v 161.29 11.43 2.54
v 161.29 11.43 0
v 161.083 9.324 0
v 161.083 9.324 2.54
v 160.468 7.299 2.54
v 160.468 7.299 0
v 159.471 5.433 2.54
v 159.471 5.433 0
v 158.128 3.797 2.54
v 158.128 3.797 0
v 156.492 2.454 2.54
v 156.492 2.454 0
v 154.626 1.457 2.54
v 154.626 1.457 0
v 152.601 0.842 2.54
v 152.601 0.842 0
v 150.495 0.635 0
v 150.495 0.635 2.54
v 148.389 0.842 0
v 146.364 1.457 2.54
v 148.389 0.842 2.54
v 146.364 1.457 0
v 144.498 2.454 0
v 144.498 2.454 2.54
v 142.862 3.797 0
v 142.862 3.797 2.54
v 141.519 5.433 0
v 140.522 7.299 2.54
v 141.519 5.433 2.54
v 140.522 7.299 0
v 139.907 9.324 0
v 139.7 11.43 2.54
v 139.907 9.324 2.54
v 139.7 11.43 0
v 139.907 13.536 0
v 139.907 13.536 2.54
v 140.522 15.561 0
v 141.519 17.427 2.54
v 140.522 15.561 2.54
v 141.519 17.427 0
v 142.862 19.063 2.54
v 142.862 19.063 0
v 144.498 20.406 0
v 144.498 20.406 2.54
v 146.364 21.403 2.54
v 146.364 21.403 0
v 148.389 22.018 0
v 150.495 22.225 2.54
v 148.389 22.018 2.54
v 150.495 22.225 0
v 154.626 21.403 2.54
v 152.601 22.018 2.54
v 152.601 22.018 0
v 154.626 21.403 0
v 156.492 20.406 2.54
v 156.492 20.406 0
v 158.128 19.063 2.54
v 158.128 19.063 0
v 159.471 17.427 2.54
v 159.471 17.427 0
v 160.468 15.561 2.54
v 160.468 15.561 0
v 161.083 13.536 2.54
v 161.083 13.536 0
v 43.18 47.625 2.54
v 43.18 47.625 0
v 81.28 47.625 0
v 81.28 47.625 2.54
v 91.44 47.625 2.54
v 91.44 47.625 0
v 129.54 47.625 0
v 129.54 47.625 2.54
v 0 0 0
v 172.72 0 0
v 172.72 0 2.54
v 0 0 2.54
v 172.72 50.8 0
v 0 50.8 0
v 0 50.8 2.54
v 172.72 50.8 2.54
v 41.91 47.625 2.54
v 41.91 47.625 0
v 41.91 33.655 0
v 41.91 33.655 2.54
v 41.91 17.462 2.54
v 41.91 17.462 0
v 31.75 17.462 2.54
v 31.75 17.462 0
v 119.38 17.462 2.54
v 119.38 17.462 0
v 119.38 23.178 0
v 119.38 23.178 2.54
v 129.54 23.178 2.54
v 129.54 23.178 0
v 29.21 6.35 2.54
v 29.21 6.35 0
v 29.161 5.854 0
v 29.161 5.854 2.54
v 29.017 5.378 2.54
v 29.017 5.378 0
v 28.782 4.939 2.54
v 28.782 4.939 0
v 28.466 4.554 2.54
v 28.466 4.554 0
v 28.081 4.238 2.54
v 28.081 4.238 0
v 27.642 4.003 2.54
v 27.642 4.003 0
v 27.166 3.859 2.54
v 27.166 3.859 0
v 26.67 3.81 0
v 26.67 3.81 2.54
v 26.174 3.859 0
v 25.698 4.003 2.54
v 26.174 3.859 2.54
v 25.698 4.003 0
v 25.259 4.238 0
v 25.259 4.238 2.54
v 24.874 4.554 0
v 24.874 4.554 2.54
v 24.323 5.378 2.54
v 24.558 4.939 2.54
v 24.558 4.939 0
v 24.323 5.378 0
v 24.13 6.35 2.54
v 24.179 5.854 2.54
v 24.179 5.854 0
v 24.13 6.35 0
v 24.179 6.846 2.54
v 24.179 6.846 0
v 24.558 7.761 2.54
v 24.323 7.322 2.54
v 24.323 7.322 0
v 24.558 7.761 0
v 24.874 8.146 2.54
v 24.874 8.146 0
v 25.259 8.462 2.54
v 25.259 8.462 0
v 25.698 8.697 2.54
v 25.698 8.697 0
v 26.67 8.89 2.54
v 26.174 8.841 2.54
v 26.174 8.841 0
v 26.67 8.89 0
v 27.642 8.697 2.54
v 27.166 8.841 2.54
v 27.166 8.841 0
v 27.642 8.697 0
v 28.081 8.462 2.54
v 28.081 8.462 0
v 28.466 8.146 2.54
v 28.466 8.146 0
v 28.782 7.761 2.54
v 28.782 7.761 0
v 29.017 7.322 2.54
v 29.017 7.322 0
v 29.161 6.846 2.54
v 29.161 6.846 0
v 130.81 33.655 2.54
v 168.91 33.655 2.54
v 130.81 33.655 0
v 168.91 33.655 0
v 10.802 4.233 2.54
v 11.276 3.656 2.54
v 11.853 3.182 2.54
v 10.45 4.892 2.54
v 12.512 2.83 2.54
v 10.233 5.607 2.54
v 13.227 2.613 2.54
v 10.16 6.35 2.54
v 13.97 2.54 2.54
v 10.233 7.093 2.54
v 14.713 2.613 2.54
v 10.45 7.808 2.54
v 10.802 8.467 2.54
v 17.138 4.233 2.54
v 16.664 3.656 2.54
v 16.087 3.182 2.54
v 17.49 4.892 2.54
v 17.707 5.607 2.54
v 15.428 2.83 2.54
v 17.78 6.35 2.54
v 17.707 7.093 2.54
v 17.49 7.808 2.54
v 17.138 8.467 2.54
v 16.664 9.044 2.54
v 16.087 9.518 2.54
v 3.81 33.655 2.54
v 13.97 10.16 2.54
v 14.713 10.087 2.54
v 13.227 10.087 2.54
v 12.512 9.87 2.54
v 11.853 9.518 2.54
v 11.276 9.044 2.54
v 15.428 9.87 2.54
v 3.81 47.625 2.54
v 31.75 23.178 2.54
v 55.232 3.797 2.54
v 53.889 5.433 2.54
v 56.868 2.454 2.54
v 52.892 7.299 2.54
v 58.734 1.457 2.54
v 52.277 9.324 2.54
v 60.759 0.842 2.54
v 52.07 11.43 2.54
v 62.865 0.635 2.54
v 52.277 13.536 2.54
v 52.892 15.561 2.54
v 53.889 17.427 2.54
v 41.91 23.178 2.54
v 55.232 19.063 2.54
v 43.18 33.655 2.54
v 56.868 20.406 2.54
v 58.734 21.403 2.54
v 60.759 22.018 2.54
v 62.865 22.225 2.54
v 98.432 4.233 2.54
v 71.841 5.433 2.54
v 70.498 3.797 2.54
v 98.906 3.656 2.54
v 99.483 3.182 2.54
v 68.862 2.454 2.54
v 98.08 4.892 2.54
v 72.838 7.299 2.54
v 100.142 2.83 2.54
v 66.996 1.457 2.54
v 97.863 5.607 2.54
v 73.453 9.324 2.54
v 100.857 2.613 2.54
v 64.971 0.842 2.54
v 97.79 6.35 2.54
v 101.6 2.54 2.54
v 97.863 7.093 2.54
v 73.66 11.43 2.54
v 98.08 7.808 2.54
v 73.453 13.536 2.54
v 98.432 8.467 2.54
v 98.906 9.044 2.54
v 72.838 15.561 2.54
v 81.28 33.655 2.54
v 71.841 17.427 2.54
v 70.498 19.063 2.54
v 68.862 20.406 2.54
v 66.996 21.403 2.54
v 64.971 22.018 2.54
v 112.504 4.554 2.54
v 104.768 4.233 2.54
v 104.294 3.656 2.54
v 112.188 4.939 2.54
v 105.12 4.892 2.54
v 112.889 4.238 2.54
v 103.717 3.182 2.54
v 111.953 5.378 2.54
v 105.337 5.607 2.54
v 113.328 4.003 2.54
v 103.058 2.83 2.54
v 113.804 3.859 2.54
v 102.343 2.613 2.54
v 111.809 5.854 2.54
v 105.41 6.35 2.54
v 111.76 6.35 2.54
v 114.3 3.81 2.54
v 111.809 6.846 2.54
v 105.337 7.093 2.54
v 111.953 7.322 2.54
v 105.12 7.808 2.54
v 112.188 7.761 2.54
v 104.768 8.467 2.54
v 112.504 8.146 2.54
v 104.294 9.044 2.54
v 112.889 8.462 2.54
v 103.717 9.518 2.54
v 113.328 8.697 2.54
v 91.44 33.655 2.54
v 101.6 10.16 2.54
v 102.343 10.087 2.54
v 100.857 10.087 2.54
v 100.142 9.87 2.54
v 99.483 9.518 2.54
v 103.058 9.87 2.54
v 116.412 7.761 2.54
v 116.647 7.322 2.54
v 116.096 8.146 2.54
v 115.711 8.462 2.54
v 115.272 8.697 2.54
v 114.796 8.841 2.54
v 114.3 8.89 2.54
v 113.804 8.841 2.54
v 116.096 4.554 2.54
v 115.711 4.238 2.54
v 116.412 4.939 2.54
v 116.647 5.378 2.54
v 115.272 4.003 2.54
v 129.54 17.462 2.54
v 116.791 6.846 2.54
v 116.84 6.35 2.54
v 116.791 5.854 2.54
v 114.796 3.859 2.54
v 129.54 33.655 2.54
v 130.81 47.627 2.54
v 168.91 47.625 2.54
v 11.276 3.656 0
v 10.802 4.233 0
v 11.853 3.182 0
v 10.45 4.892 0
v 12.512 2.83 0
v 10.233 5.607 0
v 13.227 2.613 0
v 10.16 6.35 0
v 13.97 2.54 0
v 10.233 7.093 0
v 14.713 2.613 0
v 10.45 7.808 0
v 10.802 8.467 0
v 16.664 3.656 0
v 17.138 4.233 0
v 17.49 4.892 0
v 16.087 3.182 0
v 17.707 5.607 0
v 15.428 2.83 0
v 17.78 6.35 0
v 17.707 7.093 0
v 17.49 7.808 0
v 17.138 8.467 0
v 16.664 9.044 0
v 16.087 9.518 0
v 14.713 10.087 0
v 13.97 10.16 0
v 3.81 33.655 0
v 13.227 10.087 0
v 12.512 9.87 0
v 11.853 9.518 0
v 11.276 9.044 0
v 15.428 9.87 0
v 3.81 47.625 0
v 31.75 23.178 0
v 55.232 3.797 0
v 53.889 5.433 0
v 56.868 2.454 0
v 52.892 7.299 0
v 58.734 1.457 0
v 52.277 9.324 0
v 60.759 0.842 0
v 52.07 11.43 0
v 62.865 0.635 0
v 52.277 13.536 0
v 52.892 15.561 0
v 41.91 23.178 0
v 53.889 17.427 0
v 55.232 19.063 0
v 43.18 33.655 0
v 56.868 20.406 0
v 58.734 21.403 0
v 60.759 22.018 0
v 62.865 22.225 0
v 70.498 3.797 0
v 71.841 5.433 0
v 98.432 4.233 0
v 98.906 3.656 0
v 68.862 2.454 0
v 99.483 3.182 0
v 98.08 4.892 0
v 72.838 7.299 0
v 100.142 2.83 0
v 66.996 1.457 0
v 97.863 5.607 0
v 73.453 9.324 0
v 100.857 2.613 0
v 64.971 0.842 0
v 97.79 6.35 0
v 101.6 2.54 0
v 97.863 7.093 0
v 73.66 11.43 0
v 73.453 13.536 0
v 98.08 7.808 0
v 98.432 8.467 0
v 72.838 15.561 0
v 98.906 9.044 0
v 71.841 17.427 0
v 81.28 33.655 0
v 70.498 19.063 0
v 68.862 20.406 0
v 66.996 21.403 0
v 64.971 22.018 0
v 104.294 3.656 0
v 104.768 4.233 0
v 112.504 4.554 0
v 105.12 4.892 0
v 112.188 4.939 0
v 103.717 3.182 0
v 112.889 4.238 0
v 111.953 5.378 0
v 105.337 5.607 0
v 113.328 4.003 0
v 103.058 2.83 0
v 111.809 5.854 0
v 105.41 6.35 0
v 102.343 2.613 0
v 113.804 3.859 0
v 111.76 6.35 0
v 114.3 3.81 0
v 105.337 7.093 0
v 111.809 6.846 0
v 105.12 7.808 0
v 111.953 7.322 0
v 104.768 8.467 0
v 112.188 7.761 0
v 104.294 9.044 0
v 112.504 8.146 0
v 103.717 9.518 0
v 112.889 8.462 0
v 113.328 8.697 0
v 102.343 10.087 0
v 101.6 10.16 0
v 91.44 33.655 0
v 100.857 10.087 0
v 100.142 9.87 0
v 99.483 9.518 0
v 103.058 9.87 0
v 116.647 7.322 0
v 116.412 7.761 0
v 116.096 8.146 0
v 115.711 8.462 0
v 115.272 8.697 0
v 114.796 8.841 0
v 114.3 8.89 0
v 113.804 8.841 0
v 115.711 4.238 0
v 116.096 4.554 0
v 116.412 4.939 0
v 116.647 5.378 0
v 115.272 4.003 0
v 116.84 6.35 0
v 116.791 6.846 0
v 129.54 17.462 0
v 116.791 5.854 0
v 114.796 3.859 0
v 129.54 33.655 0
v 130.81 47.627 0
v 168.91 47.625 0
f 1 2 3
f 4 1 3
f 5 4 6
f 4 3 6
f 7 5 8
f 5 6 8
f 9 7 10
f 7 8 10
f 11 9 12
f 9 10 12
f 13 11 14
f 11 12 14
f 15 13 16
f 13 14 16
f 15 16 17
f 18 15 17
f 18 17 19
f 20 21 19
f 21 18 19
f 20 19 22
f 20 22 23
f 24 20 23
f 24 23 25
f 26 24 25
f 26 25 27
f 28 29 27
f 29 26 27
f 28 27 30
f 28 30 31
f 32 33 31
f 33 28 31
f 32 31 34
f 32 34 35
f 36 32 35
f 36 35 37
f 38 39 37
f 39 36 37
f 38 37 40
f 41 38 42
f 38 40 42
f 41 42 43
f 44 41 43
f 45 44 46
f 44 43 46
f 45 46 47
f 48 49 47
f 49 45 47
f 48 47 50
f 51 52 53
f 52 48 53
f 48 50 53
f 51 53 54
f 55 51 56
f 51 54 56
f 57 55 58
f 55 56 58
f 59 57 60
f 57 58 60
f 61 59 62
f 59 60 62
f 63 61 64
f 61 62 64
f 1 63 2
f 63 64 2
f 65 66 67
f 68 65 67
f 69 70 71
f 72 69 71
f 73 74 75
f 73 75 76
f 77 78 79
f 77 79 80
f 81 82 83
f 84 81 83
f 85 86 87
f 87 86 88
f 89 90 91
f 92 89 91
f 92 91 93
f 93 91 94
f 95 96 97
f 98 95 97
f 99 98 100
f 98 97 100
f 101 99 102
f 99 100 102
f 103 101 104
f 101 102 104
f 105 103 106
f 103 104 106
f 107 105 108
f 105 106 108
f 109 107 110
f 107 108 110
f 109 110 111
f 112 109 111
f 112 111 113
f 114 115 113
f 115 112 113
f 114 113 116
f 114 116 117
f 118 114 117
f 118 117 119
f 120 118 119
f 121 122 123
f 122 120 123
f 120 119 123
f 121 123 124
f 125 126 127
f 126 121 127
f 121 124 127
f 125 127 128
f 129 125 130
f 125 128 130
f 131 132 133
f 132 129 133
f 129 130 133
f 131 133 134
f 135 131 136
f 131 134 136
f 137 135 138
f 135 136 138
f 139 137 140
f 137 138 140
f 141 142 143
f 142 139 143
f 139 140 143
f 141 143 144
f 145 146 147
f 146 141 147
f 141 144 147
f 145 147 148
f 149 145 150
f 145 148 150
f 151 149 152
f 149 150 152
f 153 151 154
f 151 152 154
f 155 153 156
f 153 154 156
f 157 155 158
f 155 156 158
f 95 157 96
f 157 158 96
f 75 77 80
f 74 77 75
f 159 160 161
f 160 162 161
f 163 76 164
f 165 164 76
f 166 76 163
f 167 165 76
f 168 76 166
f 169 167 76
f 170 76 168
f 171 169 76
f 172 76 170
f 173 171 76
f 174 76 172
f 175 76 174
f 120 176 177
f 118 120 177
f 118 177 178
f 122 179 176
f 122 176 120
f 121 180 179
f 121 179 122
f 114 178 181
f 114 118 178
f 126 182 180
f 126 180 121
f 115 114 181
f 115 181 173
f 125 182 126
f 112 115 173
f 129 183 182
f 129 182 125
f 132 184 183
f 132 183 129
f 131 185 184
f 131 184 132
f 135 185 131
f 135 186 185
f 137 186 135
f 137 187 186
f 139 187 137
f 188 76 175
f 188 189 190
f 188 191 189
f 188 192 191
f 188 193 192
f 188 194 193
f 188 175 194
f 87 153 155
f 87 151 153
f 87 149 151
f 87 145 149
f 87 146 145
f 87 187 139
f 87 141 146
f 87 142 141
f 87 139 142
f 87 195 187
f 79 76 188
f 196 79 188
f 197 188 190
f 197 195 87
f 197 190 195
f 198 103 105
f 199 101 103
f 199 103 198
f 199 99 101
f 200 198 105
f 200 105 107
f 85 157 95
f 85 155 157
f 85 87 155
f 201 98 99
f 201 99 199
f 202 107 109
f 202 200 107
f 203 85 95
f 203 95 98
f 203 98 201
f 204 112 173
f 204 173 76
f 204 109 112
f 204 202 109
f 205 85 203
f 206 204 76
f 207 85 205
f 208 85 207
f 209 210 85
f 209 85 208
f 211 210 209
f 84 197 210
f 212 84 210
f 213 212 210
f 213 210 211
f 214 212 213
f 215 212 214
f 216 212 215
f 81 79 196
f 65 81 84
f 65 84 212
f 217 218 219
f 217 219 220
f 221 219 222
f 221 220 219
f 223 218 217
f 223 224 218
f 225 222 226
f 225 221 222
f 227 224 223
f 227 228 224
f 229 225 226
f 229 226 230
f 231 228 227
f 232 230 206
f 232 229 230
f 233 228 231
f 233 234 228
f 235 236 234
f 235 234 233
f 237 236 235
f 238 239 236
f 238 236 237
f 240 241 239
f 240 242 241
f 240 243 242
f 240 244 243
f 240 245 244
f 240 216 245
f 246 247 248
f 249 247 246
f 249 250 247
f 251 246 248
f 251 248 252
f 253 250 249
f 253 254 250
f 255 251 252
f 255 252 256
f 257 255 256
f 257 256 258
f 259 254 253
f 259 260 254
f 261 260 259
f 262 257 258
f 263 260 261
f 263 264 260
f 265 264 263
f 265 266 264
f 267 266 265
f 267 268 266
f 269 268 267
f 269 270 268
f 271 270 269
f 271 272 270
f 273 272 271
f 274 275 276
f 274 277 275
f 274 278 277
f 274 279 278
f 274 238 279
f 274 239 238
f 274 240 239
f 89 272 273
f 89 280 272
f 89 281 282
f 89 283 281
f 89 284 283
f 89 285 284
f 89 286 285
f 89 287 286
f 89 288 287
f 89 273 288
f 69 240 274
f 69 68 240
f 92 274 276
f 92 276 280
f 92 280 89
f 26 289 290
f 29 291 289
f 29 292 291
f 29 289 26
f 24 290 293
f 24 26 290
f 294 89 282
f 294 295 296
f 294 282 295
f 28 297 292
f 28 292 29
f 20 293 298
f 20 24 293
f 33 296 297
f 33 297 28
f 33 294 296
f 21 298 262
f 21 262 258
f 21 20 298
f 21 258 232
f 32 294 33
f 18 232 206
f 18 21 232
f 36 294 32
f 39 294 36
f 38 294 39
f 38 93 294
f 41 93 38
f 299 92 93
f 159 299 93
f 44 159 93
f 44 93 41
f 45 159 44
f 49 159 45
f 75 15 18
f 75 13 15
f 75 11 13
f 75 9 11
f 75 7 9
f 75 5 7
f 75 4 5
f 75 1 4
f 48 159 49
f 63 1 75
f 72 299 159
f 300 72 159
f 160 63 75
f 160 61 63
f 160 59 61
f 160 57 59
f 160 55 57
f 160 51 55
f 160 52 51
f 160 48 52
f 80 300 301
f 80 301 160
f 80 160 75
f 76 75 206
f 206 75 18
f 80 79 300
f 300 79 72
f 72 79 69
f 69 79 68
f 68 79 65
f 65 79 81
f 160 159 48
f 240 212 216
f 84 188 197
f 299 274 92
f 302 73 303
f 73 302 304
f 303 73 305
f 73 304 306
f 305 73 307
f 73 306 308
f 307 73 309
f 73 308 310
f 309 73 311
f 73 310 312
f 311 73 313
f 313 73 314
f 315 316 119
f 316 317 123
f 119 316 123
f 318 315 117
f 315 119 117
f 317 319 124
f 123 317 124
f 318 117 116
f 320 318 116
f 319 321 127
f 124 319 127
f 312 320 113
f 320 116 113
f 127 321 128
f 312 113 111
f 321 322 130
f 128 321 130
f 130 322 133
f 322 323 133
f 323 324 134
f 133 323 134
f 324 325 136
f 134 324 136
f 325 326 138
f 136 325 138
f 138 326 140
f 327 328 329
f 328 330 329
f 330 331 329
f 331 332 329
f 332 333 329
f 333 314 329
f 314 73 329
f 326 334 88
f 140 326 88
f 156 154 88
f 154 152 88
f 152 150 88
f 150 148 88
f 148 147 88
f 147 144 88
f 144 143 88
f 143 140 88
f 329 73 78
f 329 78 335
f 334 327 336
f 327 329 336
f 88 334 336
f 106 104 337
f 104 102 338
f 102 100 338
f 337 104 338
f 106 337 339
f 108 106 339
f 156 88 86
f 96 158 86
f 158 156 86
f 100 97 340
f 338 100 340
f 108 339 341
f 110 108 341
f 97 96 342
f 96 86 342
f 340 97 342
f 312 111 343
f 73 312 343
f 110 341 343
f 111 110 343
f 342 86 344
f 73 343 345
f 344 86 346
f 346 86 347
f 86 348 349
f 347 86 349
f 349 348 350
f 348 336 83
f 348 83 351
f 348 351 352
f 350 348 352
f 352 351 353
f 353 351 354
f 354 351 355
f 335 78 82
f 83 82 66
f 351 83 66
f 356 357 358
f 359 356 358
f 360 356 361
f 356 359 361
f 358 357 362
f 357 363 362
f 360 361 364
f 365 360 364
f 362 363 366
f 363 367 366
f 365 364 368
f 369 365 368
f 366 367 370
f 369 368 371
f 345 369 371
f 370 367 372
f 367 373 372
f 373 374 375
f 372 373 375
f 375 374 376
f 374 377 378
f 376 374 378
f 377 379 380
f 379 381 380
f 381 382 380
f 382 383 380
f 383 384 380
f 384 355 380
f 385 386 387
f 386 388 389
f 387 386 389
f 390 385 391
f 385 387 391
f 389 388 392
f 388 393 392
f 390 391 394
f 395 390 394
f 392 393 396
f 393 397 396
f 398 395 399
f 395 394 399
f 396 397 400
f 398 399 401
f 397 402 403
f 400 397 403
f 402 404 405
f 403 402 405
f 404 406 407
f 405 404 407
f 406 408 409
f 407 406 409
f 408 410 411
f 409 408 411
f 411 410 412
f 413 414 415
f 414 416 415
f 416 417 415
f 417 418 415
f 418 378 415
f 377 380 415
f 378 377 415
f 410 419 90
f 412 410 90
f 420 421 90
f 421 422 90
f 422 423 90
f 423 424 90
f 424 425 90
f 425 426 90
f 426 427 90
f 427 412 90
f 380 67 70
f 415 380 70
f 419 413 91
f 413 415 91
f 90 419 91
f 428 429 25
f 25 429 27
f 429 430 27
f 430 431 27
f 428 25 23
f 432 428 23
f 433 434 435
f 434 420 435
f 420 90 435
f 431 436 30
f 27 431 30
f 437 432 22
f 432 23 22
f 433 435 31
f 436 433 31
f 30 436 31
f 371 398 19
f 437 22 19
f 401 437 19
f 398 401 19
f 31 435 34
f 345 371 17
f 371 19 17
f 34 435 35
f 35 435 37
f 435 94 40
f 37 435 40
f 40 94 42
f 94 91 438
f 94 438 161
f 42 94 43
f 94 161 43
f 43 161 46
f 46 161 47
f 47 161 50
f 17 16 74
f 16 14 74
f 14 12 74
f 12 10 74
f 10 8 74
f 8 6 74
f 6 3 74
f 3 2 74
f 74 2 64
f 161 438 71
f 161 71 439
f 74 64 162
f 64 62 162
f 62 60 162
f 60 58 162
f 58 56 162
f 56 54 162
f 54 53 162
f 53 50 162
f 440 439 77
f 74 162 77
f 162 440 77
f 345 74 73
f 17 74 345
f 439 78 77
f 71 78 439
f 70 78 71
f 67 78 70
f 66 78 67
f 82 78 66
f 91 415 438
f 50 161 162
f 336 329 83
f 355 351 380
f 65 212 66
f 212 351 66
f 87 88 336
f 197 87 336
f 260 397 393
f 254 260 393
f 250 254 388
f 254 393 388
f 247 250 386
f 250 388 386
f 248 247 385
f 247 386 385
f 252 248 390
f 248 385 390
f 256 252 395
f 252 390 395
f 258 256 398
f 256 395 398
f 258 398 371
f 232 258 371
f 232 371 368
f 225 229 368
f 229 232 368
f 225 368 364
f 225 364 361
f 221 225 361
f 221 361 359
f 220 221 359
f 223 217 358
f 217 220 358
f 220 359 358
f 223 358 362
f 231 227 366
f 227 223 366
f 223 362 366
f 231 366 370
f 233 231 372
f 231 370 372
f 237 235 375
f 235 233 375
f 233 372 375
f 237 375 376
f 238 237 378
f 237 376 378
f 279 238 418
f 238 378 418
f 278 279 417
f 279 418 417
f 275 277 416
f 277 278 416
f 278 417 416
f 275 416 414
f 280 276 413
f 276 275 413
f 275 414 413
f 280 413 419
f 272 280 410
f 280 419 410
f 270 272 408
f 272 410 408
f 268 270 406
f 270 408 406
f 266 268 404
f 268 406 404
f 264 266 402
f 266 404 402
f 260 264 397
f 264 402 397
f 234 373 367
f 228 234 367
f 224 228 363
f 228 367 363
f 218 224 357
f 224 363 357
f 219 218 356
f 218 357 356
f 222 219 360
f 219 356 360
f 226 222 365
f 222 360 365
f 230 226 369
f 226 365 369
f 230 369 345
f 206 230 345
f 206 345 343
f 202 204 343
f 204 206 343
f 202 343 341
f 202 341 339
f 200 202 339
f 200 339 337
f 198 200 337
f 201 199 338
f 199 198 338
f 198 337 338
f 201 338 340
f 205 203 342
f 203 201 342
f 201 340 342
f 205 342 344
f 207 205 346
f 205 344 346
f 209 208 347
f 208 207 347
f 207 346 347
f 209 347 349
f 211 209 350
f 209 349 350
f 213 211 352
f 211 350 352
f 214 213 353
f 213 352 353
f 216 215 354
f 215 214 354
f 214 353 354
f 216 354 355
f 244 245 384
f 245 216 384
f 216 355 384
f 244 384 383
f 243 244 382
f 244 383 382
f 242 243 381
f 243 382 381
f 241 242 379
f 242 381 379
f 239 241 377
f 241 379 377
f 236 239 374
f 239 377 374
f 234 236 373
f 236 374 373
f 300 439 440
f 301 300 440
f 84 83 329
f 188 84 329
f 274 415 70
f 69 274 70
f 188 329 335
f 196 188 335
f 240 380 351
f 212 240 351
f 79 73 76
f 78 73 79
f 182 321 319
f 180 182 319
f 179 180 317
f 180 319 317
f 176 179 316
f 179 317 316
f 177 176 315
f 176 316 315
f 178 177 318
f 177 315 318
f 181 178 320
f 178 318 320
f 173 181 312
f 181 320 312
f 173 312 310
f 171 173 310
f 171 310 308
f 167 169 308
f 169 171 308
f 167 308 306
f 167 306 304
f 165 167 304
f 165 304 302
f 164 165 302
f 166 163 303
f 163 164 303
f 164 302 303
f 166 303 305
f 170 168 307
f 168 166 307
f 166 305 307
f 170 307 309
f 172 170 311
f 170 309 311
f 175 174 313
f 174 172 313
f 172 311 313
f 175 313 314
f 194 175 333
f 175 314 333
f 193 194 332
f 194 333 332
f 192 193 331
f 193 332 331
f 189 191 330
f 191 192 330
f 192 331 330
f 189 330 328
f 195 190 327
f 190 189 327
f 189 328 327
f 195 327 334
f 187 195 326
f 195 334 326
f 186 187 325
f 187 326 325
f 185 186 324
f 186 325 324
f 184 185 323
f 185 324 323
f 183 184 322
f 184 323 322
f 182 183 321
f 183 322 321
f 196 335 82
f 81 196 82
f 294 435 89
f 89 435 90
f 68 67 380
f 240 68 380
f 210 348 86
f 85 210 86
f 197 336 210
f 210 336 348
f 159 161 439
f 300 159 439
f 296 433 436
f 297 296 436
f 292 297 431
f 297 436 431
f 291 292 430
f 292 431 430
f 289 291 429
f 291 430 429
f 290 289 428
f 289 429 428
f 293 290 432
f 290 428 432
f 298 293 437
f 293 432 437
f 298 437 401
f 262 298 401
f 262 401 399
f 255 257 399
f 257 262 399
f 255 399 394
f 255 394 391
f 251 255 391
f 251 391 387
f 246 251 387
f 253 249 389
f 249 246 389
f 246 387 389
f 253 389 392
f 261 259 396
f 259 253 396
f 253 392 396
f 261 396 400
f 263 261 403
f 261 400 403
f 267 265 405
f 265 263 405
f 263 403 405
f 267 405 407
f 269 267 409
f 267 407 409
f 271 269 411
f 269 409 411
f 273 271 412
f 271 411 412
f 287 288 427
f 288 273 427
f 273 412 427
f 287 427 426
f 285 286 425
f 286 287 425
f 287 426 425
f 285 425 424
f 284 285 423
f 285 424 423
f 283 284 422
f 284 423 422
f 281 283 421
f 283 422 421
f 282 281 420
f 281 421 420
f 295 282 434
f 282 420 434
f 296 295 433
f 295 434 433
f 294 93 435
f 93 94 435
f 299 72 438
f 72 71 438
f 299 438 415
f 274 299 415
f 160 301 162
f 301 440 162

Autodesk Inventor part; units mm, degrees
ref_plane "YZ Plane" through (0, 0, 0) normal (1, 0, 0) x (0, 1, 0)
ref_plane "XZ Plane" through (0, 0, 0) normal (0, 1, 0) x (-1, 0, 0)
ref_plane "XY Plane" through (0, 0, 0) normal (0, 0, 1) x (1, 0, 0)
sketch "Náčrt1" plane through (0, 0, 0) normal (0, 0, 1) x (1, 0, 0)
  point P0 (0, 0)
sketch "Náčrt2" plane through (0, 0, 0) normal (0, 0, 1) x (1, 0, 0)
  line L0 (130.81, 47.627) -> (168.91, 47.625)
  line L1 (168.91, 47.625) -> (168.91, 33.655)
  line L2 (168.91, 33.655) -> (130.81, 33.655)
  line L3 (130.81, 33.655) -> (130.81, 47.627)
  line L4 (3.81, 47.625) -> (41.91, 47.625)
  line L5 (41.91, 47.625) -> (41.91, 33.655)
  line L6 (41.91, 33.655) -> (3.81, 33.655)
  line L7 (3.81, 33.655) -> (3.81, 47.625)
  line L8 (43.18, 47.625) -> (81.28, 47.625)
  line L9 (81.28, 47.625) -> (81.28, 33.655)
  line L10 (81.28, 33.655) -> (43.18, 33.655)
  line L11 (43.18, 33.655) -> (43.18, 47.625)
  line L12 (91.44, 47.625) -> (129.54, 47.625)
  line L13 (129.54, 47.625) -> (129.54, 33.655)
  line L14 (129.54, 33.655) -> (91.44, 33.655)
  line L15 (91.44, 33.655) -> (91.44, 47.625)
  circle A0 centre (26.67, 6.35) radius 2.54
  circle A1 centre (13.97, 6.35) radius 3.81
  circle A2 centre (62.865, 11.43) radius 10.795
  circle A3 centre (114.3, 6.35) radius 2.54
  circle A4 centre (101.6, 6.35) radius 3.81
  circle A5 centre (150.495, 11.43) radius 10.795
  line L16 (31.75, 23.1775) -> (41.91, 23.1775)
  line L17 (41.91, 23.1775) -> (41.91, 17.4625)
  line L18 (41.91, 17.4625) -> (31.75, 17.4625)
  line L19 (31.75, 17.4625) -> (31.75, 23.1775)
  line L20 (119.38, 23.1775) -> (129.54, 23.1775)
  line L21 (129.54, 23.1775) -> (129.54, 17.4625)
  line L22 (129.54, 17.4625) -> (119.38, 17.4625)
  line L23 (119.38, 17.4625) -> (119.38, 23.1775)
  line L24 (0, 50.8) -> (172.72, 50.8)
  line L25 (172.72, 50.8) -> (172.72, 0)
  line L26 (172.72, 0) -> (0, 0)
  line L27 (0, 0) -> (0, 50.8)
extrude "Vysunutí1" add sketch "Náčrt2" along normal blind 2.54
properties part number "NavCom_mask"
